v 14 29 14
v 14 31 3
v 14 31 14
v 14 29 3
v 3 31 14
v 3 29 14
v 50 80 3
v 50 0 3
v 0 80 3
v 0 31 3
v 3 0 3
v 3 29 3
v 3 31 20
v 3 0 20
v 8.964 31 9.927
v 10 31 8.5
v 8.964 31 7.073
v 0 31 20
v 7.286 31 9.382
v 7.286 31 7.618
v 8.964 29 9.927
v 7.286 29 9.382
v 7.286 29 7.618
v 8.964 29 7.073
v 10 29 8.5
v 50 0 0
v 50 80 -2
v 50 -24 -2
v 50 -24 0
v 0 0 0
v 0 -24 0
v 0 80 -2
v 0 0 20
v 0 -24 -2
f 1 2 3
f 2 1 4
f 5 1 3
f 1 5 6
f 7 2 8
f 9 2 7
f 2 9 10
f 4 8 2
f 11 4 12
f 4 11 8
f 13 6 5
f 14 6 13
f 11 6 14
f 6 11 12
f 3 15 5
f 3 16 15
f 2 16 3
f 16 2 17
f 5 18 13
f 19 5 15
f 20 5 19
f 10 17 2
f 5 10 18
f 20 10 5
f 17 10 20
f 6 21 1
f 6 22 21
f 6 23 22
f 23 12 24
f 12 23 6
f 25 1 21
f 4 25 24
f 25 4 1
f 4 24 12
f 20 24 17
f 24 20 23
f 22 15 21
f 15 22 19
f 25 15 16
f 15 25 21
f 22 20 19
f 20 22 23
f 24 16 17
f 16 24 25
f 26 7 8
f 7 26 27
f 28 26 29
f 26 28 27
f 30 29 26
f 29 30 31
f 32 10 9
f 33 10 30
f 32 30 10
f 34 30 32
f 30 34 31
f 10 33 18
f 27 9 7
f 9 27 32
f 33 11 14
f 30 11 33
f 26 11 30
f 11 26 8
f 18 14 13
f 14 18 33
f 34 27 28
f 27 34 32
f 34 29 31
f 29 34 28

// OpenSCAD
bracket_depth = 80;

g1000_width = 312.00;
g1000_height = 217.00;
bezel_width = 3;
frame_width = g1000_width + 2 * bezel_width;
frame_height = 20; //g1000_height + 2 * bezel_width;

bracket_width = 50; //frame_width / 2;
bracket_bottom_thickness = bezel_width;

clasp_y_offset = 29;
clasp_thickness = 2;
clasp_hole_offset = 5.5;
clasp_hole_diameter = 3.0;
clasp_width = clasp_hole_offset * 2;
clasp_height = clasp_width;

ledge_forward_protrusion = 24;
ledge_thickness = 2;


module draw_bottom() {
    cube([bracket_width, bracket_depth, bracket_bottom_thickness]);
}

module draw_ledge() {
    translate([0, -ledge_forward_protrusion, -ledge_thickness])
        cube([bracket_width, bracket_depth + ledge_forward_protrusion, ledge_thickness]);
}

module draw_outer_side() {
    cube([bezel_width, clasp_y_offset + clasp_thickness, frame_height]);
}

module draw_clasp() {
    translate([bezel_width, clasp_y_offset, bracket_bottom_thickness]) {
        difference() {
            cube([clasp_width, clasp_thickness, clasp_height]);
            
            
            translate([clasp_hole_offset, clasp_thickness / 2, clasp_hole_offset])
                rotate([90, 0, 0])
                    cylinder(h = clasp_thickness, d = clasp_hole_diameter, center = true);
            
        }
    }
}

module draw_left() {
    draw_bottom();
    draw_outer_side();
    draw_clasp();
    draw_ledge();
}

module draw_right() {
    draw_bottom();
    translate([bracket_width - bracket_bottom_thickness, 0, 0])
        draw_outer_side();
    translate([bracket_width - 2 * bracket_bottom_thickness - clasp_width, 0, 0])
        draw_clasp();
    draw_ledge();
}

draw_left();
//draw_right();
